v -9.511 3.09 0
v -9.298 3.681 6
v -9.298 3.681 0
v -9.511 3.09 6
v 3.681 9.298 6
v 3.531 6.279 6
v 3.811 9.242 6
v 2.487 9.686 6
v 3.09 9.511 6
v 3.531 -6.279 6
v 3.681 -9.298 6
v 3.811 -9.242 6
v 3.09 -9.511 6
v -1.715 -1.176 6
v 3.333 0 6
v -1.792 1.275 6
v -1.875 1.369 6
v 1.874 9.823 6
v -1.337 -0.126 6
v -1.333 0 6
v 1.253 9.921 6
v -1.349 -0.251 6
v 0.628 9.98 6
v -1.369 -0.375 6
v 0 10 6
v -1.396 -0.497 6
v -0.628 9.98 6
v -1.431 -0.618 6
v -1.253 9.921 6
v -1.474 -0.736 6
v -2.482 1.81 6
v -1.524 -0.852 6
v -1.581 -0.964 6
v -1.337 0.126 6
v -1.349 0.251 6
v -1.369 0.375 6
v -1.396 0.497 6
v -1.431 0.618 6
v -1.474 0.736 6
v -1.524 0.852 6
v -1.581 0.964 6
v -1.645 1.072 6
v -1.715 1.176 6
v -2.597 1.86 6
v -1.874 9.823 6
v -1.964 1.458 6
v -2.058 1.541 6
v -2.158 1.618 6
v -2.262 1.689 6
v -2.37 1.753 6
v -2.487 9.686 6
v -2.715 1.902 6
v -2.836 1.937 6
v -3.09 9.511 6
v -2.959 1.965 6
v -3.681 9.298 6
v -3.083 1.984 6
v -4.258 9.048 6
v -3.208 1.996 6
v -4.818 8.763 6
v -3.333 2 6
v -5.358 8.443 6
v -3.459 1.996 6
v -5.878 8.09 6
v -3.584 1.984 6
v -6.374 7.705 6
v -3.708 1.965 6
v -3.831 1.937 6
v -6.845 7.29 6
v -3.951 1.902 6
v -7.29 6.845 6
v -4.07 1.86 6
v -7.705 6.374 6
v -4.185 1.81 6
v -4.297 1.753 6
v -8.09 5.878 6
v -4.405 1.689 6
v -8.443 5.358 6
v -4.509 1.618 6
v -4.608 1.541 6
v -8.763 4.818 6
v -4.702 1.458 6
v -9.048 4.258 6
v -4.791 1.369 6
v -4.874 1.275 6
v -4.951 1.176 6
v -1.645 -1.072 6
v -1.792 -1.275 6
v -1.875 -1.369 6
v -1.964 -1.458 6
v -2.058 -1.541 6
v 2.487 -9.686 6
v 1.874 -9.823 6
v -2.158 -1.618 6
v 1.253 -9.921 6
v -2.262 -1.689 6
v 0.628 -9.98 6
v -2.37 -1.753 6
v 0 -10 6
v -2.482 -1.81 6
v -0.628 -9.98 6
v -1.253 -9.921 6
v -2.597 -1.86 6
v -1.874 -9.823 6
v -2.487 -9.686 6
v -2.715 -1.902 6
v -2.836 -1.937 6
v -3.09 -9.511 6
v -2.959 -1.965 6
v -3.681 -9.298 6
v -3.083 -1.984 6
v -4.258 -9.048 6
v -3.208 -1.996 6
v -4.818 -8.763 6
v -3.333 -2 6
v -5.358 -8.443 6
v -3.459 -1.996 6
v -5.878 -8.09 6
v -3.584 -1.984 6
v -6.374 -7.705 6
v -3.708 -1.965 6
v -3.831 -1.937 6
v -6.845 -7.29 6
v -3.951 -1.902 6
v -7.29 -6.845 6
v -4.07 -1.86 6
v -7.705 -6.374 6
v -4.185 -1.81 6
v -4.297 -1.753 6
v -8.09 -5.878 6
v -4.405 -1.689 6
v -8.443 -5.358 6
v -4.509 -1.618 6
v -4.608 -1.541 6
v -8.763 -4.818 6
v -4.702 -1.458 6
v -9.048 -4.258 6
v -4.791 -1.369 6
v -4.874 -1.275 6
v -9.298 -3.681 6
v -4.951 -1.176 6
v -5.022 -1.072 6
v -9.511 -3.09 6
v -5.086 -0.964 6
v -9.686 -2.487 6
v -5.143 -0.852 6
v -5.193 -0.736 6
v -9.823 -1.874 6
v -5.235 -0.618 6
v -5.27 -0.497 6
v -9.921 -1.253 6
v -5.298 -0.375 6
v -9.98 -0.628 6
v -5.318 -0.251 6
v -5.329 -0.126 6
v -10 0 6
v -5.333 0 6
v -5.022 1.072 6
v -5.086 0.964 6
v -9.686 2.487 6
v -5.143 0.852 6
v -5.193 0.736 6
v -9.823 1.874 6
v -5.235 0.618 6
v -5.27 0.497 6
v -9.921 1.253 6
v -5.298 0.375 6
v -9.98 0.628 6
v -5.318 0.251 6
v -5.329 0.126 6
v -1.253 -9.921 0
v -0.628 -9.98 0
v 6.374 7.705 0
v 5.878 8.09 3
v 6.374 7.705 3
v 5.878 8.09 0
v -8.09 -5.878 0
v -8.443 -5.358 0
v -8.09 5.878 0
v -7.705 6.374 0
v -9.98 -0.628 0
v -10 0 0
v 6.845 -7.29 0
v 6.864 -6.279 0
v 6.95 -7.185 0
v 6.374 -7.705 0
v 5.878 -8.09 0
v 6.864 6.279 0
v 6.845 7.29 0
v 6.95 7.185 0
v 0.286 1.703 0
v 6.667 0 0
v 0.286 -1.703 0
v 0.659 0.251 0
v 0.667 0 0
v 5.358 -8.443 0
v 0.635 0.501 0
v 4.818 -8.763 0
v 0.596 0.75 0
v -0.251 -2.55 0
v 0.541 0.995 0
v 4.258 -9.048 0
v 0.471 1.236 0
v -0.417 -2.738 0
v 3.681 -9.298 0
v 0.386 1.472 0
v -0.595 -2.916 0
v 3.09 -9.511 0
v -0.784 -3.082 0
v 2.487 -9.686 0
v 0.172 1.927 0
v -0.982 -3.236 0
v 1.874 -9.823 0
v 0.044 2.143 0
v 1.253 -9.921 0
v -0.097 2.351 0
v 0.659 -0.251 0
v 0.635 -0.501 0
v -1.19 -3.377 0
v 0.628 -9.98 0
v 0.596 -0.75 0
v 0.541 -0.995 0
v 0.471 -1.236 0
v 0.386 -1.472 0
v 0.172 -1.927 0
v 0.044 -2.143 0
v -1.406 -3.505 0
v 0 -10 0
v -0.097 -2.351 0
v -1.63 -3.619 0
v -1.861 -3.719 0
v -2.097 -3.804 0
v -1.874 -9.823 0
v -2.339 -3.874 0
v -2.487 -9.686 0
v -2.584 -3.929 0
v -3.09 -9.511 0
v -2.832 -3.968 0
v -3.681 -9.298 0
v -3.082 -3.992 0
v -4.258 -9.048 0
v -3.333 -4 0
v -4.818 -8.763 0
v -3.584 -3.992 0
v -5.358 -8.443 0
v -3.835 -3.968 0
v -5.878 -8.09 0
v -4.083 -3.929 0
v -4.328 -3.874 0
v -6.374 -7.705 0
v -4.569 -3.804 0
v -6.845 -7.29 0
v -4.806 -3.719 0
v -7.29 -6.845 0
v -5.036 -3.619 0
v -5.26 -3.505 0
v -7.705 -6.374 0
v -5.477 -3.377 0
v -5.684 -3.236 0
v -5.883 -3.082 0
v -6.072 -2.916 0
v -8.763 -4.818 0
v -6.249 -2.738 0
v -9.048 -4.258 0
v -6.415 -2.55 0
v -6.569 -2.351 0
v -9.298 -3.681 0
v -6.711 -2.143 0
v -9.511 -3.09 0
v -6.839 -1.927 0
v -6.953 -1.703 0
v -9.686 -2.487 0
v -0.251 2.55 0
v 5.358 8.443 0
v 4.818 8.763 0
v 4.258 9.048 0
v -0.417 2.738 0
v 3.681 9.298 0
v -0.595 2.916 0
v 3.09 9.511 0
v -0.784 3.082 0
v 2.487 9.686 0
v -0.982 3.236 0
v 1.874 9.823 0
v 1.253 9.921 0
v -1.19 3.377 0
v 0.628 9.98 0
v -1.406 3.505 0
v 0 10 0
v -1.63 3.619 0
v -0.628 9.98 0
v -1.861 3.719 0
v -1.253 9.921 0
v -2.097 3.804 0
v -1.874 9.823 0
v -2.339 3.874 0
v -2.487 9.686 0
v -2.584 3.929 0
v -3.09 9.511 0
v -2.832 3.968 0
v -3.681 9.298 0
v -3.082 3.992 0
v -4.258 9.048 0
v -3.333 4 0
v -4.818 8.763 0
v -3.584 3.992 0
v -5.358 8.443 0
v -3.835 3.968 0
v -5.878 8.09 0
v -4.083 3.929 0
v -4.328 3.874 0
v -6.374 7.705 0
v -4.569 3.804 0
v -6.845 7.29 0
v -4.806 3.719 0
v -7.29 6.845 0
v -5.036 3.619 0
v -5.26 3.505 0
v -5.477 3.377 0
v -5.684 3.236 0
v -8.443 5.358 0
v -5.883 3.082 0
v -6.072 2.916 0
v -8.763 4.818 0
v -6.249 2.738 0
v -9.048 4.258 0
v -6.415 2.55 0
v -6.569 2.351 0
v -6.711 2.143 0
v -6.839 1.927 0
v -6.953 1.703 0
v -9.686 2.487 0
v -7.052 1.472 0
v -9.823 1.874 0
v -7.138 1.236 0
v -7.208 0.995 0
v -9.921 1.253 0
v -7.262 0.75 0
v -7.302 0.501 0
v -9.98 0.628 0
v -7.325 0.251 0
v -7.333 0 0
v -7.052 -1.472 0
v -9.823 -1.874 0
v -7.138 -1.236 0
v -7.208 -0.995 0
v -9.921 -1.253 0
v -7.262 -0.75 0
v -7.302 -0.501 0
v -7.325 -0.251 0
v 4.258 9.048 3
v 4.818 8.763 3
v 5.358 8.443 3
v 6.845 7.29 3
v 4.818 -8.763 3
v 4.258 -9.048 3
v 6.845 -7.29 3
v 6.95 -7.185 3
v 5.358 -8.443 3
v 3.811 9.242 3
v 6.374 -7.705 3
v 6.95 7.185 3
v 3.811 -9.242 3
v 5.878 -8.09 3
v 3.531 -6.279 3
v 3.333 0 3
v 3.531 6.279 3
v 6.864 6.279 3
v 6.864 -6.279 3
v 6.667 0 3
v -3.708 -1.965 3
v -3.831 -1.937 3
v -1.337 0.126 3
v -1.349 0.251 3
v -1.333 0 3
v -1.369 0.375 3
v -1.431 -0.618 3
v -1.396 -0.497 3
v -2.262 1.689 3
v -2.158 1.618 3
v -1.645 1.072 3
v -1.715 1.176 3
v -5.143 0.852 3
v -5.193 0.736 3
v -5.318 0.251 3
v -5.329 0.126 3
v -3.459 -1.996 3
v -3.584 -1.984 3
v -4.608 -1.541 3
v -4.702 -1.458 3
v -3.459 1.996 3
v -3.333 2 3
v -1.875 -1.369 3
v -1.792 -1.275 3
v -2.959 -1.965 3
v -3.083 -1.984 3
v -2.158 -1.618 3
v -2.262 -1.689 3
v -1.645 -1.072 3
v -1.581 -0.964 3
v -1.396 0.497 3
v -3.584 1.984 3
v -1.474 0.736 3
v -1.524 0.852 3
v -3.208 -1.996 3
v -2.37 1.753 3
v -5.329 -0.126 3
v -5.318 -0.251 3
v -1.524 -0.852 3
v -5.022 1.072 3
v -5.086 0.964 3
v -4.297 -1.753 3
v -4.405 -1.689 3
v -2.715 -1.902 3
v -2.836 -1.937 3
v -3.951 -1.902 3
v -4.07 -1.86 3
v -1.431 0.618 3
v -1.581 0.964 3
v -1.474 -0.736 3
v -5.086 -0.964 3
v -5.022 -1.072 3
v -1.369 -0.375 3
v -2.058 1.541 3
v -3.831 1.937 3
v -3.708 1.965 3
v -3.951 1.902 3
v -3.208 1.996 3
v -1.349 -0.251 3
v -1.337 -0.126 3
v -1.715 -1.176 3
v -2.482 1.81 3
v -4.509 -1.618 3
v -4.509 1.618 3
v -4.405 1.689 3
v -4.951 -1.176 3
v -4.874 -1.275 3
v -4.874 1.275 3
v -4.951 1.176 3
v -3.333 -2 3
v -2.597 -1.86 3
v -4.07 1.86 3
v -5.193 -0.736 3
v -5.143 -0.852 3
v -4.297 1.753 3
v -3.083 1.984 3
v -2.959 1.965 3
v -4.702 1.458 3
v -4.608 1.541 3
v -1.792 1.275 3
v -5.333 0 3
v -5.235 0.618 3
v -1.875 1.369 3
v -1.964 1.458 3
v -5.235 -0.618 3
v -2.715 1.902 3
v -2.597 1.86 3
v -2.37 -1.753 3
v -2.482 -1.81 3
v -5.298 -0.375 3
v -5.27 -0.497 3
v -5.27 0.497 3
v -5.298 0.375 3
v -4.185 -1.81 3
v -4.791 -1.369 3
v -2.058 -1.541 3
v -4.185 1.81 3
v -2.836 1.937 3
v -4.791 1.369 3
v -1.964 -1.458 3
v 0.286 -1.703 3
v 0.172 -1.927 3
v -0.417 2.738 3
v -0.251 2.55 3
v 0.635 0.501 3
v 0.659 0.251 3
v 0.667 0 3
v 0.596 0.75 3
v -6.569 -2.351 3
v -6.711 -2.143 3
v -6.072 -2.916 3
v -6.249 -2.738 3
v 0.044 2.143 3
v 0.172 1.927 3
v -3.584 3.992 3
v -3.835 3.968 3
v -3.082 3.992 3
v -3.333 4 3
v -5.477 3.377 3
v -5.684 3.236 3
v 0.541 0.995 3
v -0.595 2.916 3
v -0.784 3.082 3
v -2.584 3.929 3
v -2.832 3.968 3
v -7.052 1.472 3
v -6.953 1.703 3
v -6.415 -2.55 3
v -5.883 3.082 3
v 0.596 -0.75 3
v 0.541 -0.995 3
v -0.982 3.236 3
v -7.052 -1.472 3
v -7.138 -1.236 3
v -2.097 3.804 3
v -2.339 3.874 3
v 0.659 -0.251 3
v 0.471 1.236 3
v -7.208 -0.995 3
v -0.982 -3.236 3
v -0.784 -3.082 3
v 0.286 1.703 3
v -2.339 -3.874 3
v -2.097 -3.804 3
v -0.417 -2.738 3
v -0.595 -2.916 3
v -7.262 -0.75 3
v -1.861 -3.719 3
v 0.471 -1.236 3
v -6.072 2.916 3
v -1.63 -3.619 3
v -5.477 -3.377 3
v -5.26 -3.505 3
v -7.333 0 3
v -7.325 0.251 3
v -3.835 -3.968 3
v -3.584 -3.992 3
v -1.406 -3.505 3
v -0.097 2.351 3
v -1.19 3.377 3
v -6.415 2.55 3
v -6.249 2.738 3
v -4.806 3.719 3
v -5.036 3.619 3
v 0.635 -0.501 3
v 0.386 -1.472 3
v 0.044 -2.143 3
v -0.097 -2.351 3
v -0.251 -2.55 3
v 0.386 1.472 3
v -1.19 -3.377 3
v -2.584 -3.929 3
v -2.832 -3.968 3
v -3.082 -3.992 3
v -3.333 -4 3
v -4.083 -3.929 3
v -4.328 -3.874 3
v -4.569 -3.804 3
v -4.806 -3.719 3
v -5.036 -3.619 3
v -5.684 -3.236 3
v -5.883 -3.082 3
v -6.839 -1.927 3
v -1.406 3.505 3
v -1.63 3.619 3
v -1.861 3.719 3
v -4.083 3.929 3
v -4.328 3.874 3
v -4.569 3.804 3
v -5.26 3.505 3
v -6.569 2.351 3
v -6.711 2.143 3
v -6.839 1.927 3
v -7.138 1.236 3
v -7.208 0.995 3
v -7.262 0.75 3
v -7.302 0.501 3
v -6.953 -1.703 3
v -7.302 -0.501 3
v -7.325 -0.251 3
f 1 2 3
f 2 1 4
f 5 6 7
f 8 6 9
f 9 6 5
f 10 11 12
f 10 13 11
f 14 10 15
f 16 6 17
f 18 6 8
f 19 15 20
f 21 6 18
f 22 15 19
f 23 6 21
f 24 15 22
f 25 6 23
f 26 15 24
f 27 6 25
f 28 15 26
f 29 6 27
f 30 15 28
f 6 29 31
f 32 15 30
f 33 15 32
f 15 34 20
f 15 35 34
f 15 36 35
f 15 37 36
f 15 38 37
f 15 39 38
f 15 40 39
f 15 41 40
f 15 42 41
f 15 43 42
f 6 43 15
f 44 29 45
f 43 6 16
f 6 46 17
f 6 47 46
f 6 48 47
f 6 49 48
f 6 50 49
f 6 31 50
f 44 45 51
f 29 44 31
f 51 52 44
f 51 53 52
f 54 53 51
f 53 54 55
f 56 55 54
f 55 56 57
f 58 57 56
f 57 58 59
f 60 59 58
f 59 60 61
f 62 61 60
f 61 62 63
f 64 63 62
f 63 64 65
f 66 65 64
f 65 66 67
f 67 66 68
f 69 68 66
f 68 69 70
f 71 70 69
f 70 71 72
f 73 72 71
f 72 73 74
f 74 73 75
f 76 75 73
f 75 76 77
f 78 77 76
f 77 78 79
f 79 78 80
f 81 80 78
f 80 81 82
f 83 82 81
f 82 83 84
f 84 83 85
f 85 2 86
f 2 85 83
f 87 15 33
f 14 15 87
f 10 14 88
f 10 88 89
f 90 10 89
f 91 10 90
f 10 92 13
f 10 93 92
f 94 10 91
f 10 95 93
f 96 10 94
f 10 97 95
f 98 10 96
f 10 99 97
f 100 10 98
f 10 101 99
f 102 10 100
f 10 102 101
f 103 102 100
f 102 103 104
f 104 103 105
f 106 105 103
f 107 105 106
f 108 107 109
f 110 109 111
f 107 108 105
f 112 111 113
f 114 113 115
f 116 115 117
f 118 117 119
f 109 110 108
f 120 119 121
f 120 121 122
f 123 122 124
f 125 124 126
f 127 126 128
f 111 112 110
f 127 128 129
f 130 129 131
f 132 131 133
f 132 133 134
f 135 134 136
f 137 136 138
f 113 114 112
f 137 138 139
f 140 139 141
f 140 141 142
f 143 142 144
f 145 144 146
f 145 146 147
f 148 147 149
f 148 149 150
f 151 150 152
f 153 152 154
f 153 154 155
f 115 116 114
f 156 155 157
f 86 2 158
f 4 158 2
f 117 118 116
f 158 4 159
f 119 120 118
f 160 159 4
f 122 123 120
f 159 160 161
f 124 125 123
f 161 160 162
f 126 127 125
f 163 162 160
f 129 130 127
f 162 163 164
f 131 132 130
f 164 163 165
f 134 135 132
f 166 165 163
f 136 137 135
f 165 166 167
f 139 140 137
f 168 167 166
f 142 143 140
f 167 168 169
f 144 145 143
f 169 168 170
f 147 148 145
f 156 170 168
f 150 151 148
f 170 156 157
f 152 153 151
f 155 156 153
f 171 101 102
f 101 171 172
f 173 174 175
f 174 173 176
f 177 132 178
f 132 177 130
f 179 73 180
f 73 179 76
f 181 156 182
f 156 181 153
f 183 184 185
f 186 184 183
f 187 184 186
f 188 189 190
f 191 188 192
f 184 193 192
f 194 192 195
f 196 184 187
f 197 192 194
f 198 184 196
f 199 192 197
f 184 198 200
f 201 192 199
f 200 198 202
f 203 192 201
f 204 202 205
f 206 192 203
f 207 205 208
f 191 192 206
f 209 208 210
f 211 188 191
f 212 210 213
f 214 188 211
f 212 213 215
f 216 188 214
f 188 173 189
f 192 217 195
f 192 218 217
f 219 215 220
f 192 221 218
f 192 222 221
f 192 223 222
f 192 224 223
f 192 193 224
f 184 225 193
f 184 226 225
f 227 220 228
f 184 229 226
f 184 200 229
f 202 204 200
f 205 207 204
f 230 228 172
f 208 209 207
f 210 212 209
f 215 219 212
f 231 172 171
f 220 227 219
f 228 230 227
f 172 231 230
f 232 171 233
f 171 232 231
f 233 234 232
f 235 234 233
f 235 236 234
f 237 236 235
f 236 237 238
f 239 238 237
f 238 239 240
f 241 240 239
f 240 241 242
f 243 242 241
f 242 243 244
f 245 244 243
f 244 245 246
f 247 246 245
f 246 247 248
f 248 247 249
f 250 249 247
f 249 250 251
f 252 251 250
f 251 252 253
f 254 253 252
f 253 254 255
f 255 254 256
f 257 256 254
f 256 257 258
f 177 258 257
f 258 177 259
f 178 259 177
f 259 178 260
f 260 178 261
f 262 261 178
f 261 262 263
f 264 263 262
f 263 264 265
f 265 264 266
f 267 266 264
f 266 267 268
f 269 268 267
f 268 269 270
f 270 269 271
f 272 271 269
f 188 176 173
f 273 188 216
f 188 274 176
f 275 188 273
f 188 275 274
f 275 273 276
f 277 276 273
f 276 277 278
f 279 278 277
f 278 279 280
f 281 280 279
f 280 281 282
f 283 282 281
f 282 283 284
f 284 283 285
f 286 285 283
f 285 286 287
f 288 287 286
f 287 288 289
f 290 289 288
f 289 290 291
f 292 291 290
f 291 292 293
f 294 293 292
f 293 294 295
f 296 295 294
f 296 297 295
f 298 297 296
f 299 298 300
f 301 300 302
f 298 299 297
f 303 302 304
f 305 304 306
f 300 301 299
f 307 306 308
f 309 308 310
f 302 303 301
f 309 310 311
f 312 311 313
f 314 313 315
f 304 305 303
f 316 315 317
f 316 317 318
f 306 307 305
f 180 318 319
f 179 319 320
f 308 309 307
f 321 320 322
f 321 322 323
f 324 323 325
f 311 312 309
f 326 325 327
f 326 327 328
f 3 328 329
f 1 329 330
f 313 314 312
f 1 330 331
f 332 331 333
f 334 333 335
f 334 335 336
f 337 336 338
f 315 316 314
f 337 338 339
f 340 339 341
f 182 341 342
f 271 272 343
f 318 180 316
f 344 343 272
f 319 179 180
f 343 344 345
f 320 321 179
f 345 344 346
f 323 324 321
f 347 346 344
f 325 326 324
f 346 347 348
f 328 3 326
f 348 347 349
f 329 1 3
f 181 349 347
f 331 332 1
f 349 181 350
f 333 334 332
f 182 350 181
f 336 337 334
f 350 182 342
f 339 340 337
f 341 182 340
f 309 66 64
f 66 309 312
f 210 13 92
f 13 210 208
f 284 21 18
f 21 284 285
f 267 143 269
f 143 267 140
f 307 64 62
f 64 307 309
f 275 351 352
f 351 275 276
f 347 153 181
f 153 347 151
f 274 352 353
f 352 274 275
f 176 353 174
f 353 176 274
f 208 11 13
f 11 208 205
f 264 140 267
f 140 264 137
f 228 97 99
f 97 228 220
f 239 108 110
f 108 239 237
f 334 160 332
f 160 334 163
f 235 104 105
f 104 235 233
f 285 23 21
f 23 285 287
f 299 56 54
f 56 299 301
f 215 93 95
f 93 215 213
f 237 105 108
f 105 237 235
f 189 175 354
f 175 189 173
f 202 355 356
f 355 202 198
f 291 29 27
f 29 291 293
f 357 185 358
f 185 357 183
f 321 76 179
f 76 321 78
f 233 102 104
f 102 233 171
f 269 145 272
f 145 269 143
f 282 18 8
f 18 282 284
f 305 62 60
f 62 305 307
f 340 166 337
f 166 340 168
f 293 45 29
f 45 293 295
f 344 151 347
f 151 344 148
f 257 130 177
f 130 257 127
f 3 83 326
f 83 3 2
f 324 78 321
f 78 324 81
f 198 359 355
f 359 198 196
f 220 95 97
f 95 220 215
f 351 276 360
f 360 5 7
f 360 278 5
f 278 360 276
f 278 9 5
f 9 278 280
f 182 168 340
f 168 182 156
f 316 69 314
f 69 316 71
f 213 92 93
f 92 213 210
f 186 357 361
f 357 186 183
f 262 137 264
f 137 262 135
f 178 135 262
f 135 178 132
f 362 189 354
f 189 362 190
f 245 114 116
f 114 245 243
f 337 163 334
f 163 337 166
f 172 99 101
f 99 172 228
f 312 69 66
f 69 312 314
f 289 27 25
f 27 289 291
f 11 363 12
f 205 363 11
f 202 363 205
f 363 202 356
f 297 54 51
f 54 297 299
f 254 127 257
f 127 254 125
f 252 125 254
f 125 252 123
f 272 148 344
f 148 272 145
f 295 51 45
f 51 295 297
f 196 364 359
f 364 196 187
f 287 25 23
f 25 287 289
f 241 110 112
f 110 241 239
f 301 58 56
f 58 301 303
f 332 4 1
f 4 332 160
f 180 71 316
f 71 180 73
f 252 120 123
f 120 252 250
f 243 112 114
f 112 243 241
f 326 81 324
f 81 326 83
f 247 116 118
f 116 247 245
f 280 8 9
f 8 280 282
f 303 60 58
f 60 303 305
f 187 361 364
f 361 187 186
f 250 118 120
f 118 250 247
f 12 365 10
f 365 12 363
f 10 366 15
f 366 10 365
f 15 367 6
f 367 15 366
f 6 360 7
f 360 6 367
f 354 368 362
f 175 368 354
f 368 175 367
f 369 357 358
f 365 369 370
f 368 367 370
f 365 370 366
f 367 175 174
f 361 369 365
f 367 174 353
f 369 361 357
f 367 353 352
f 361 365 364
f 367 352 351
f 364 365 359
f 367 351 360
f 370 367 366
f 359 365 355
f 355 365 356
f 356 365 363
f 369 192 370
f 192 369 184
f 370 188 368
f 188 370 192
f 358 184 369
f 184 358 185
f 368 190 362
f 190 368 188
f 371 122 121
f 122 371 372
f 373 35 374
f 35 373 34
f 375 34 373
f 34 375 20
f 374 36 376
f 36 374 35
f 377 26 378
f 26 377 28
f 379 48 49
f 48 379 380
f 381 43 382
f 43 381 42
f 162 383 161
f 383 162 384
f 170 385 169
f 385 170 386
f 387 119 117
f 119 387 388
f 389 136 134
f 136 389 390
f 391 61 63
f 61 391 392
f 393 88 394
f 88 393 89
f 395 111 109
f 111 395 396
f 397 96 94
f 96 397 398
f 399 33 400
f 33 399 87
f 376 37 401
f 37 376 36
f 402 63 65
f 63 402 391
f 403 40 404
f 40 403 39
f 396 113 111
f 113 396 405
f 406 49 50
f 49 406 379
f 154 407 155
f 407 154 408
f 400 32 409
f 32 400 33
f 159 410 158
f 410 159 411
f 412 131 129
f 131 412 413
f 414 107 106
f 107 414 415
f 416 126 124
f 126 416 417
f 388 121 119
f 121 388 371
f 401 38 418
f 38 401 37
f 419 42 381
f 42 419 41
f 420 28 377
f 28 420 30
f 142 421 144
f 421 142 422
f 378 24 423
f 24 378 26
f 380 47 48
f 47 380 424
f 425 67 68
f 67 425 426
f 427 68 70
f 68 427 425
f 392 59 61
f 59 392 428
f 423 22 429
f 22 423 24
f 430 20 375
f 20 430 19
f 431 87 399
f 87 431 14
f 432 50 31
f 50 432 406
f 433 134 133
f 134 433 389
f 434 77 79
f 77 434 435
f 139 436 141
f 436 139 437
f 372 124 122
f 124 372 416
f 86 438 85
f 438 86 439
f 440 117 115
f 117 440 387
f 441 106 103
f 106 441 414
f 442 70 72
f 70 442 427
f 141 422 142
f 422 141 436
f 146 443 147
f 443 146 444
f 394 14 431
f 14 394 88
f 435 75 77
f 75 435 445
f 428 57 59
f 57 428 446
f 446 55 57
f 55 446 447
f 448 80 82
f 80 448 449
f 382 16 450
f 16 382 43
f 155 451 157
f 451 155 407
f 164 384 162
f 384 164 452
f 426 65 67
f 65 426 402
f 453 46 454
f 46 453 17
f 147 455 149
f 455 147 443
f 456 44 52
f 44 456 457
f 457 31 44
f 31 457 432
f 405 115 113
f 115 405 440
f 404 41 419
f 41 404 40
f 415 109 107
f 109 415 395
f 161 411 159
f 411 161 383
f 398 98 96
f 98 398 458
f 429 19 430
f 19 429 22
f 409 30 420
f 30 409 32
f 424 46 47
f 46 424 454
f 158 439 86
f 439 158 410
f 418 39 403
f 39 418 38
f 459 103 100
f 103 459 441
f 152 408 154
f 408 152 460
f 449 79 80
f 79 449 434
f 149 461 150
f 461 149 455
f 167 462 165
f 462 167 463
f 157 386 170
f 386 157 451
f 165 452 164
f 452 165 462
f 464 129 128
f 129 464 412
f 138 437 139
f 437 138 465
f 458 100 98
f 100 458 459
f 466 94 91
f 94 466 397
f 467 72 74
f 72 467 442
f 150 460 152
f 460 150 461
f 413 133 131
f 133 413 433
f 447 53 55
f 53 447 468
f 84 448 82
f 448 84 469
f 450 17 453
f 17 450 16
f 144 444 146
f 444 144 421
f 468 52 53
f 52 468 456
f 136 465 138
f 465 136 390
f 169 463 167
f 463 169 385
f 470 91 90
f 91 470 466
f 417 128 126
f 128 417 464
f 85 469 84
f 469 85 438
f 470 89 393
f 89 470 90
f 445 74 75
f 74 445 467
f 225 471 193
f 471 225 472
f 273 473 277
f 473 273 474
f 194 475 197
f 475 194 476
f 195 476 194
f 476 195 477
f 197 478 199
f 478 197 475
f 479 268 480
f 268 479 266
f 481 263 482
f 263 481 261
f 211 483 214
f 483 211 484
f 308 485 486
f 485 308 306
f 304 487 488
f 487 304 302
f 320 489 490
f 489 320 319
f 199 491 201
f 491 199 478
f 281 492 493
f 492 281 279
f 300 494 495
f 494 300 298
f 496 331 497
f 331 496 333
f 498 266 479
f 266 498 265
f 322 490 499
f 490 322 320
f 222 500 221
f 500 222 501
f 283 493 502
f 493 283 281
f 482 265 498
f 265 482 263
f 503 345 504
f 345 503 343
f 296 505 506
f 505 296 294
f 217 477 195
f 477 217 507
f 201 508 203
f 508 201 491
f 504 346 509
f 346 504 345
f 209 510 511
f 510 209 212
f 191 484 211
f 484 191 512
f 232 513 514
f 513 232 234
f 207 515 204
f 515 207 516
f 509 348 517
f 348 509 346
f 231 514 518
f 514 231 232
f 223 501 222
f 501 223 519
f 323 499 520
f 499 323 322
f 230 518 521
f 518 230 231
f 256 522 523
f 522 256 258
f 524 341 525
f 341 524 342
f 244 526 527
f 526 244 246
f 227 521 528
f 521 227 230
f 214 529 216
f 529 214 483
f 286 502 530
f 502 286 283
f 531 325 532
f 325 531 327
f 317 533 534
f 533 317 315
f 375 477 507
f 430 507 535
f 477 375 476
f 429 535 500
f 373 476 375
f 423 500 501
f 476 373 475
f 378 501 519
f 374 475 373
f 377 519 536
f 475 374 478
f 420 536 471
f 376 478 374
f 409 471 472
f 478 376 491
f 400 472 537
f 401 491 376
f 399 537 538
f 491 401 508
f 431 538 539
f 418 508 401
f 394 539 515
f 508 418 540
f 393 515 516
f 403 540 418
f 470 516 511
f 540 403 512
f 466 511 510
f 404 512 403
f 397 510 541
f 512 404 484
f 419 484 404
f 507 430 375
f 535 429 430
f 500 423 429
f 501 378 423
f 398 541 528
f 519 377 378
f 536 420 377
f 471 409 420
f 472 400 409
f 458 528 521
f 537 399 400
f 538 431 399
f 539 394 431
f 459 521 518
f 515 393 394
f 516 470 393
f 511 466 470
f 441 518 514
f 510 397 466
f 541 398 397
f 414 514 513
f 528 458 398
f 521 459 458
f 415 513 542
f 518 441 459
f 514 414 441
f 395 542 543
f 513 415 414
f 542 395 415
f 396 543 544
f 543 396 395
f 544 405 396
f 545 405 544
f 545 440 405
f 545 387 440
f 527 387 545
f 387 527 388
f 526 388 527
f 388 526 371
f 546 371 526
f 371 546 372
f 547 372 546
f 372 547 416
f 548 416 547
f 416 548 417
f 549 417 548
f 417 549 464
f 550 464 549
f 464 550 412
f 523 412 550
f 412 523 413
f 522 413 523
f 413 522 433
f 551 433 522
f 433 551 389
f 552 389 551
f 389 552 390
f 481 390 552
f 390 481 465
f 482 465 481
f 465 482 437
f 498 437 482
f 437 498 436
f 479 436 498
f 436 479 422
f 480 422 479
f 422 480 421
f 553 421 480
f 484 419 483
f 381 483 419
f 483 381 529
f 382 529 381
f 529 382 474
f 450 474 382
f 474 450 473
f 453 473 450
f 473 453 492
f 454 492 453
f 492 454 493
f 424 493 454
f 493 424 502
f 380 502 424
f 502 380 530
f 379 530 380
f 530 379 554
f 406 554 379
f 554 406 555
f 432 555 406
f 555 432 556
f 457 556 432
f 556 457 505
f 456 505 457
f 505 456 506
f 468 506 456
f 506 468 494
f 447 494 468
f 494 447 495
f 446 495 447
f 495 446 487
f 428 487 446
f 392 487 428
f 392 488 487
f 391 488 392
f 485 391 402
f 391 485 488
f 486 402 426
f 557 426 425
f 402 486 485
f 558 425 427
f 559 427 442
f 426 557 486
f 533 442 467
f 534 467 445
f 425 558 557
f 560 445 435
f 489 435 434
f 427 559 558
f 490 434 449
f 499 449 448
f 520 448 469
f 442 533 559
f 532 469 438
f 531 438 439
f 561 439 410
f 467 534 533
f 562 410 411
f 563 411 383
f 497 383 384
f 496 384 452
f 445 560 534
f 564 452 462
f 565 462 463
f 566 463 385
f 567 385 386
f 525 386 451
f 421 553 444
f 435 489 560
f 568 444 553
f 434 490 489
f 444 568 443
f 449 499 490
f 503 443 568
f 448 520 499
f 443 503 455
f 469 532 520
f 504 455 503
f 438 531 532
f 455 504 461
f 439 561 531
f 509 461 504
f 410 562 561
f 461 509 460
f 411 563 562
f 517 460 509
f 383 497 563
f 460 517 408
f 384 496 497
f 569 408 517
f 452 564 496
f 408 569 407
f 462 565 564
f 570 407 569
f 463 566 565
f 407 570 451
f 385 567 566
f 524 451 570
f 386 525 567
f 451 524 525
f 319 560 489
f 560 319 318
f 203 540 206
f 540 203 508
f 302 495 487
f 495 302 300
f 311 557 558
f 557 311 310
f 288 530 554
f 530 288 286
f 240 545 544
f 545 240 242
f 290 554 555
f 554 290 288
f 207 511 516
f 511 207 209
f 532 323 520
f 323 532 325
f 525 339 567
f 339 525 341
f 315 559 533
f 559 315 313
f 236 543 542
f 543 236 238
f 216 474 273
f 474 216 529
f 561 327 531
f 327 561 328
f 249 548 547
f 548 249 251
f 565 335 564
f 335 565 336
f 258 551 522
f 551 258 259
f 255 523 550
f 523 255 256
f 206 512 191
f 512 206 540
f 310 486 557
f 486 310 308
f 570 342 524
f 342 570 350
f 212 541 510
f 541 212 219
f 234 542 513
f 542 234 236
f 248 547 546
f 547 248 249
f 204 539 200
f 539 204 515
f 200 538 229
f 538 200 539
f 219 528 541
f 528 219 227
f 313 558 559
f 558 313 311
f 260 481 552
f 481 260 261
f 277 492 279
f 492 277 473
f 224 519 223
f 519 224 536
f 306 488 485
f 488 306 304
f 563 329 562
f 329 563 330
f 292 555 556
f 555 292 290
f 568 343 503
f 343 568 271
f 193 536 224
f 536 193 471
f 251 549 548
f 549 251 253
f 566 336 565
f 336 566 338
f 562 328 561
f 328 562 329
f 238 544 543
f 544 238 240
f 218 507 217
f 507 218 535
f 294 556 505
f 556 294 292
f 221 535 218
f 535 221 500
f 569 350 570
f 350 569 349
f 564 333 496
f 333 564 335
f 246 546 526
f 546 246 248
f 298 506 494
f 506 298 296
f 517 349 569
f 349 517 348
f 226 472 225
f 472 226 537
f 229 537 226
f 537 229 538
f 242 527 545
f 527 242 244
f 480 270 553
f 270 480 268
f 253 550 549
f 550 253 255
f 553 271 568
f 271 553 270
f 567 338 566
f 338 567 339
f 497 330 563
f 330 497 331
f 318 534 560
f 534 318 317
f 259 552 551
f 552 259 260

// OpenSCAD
/* [Support] */
diam_ext_support=20; // [10:1:30]
epaisseur_sur_vitre=3; // [0:0.1:10]
encoche_percent=0.5; // [0.3:0.1:0.7]
epaisseur_sous_vitre=0; // [0:0.1:10]

/* [Screw] */
vis_diam=4; // [2:0.1:5]
vis_tete_diam=8; // [4:0.1:10]

/* [Glass] */
vitre_diam=200; // [150:1:250]
vitre_haut=3; // [2:0.1:5]

/* [Hidden] */
artefact=0.05;
globalView=0; //[0,1] Put 1 if you want to see a global view

module support_vitre() {
    position_encoche=diam_ext_support/6;
    difference() {
        union(){
        cylinder(h=epaisseur_sur_vitre+vitre_haut+epaisseur_sous_vitre,d=diam_ext_support,$fn=100); //Piece brute
        translate([0,0,epaisseur_sur_vitre+vitre_haut])
            cylinder(h=epaisseur_sous_vitre,d=diam_ext_support,$fn=100); //Piece dessous
        }
        translate([vitre_diam/2+position_encoche,0,epaisseur_sur_vitre])
            cylinder(h=vitre_haut+artefact,d=vitre_diam,$fn=100); //Trou Vitre

        translate([vitre_diam/2+position_encoche/encoche_percent,0,-artefact])
            cylinder(h=vitre_haut+epaisseur_sur_vitre+2*artefact,d=vitre_diam,$fn=100); //Encoche dessus vitre

        translate([-position_encoche,0,-artefact])
            cylinder(h=epaisseur_sur_vitre+vitre_haut+epaisseur_sous_vitre+2*artefact,d=vis_diam,$fn=100); //Trou vis
        
        translate([-position_encoche,0,-artefact])
            cylinder(h=epaisseur_sur_vitre+artefact,d=vis_tete_diam,$fn=100); //Trou tete vis
        }
}

module glass() {
    translate([0,0,-artefact])
        cylinder(h=vitre_haut+artefact,d=vitre_diam,$fn=100); //Vitre
}

if (globalView) %translate([0,0,10]) rotate([90,0,0]) text("Down view");
if (globalView) %color("LightCyan") translate([0,0,epaisseur_sur_vitre-artefact]) glass();

if (globalView) color("gold") translate([-vitre_diam/2-diam_ext_support/6,0,0]) support_vitre();
else support_vitre();

if (globalView)
    for(angle=[60:60:300])
        %color("gold") rotate([0,0,angle]) translate([-vitre_diam/2-diam_ext_support/6,0,0]) support_vitre();

if (globalView) %translate([0,0,-10]) rotate([-90,0,0]) text("Top view");
